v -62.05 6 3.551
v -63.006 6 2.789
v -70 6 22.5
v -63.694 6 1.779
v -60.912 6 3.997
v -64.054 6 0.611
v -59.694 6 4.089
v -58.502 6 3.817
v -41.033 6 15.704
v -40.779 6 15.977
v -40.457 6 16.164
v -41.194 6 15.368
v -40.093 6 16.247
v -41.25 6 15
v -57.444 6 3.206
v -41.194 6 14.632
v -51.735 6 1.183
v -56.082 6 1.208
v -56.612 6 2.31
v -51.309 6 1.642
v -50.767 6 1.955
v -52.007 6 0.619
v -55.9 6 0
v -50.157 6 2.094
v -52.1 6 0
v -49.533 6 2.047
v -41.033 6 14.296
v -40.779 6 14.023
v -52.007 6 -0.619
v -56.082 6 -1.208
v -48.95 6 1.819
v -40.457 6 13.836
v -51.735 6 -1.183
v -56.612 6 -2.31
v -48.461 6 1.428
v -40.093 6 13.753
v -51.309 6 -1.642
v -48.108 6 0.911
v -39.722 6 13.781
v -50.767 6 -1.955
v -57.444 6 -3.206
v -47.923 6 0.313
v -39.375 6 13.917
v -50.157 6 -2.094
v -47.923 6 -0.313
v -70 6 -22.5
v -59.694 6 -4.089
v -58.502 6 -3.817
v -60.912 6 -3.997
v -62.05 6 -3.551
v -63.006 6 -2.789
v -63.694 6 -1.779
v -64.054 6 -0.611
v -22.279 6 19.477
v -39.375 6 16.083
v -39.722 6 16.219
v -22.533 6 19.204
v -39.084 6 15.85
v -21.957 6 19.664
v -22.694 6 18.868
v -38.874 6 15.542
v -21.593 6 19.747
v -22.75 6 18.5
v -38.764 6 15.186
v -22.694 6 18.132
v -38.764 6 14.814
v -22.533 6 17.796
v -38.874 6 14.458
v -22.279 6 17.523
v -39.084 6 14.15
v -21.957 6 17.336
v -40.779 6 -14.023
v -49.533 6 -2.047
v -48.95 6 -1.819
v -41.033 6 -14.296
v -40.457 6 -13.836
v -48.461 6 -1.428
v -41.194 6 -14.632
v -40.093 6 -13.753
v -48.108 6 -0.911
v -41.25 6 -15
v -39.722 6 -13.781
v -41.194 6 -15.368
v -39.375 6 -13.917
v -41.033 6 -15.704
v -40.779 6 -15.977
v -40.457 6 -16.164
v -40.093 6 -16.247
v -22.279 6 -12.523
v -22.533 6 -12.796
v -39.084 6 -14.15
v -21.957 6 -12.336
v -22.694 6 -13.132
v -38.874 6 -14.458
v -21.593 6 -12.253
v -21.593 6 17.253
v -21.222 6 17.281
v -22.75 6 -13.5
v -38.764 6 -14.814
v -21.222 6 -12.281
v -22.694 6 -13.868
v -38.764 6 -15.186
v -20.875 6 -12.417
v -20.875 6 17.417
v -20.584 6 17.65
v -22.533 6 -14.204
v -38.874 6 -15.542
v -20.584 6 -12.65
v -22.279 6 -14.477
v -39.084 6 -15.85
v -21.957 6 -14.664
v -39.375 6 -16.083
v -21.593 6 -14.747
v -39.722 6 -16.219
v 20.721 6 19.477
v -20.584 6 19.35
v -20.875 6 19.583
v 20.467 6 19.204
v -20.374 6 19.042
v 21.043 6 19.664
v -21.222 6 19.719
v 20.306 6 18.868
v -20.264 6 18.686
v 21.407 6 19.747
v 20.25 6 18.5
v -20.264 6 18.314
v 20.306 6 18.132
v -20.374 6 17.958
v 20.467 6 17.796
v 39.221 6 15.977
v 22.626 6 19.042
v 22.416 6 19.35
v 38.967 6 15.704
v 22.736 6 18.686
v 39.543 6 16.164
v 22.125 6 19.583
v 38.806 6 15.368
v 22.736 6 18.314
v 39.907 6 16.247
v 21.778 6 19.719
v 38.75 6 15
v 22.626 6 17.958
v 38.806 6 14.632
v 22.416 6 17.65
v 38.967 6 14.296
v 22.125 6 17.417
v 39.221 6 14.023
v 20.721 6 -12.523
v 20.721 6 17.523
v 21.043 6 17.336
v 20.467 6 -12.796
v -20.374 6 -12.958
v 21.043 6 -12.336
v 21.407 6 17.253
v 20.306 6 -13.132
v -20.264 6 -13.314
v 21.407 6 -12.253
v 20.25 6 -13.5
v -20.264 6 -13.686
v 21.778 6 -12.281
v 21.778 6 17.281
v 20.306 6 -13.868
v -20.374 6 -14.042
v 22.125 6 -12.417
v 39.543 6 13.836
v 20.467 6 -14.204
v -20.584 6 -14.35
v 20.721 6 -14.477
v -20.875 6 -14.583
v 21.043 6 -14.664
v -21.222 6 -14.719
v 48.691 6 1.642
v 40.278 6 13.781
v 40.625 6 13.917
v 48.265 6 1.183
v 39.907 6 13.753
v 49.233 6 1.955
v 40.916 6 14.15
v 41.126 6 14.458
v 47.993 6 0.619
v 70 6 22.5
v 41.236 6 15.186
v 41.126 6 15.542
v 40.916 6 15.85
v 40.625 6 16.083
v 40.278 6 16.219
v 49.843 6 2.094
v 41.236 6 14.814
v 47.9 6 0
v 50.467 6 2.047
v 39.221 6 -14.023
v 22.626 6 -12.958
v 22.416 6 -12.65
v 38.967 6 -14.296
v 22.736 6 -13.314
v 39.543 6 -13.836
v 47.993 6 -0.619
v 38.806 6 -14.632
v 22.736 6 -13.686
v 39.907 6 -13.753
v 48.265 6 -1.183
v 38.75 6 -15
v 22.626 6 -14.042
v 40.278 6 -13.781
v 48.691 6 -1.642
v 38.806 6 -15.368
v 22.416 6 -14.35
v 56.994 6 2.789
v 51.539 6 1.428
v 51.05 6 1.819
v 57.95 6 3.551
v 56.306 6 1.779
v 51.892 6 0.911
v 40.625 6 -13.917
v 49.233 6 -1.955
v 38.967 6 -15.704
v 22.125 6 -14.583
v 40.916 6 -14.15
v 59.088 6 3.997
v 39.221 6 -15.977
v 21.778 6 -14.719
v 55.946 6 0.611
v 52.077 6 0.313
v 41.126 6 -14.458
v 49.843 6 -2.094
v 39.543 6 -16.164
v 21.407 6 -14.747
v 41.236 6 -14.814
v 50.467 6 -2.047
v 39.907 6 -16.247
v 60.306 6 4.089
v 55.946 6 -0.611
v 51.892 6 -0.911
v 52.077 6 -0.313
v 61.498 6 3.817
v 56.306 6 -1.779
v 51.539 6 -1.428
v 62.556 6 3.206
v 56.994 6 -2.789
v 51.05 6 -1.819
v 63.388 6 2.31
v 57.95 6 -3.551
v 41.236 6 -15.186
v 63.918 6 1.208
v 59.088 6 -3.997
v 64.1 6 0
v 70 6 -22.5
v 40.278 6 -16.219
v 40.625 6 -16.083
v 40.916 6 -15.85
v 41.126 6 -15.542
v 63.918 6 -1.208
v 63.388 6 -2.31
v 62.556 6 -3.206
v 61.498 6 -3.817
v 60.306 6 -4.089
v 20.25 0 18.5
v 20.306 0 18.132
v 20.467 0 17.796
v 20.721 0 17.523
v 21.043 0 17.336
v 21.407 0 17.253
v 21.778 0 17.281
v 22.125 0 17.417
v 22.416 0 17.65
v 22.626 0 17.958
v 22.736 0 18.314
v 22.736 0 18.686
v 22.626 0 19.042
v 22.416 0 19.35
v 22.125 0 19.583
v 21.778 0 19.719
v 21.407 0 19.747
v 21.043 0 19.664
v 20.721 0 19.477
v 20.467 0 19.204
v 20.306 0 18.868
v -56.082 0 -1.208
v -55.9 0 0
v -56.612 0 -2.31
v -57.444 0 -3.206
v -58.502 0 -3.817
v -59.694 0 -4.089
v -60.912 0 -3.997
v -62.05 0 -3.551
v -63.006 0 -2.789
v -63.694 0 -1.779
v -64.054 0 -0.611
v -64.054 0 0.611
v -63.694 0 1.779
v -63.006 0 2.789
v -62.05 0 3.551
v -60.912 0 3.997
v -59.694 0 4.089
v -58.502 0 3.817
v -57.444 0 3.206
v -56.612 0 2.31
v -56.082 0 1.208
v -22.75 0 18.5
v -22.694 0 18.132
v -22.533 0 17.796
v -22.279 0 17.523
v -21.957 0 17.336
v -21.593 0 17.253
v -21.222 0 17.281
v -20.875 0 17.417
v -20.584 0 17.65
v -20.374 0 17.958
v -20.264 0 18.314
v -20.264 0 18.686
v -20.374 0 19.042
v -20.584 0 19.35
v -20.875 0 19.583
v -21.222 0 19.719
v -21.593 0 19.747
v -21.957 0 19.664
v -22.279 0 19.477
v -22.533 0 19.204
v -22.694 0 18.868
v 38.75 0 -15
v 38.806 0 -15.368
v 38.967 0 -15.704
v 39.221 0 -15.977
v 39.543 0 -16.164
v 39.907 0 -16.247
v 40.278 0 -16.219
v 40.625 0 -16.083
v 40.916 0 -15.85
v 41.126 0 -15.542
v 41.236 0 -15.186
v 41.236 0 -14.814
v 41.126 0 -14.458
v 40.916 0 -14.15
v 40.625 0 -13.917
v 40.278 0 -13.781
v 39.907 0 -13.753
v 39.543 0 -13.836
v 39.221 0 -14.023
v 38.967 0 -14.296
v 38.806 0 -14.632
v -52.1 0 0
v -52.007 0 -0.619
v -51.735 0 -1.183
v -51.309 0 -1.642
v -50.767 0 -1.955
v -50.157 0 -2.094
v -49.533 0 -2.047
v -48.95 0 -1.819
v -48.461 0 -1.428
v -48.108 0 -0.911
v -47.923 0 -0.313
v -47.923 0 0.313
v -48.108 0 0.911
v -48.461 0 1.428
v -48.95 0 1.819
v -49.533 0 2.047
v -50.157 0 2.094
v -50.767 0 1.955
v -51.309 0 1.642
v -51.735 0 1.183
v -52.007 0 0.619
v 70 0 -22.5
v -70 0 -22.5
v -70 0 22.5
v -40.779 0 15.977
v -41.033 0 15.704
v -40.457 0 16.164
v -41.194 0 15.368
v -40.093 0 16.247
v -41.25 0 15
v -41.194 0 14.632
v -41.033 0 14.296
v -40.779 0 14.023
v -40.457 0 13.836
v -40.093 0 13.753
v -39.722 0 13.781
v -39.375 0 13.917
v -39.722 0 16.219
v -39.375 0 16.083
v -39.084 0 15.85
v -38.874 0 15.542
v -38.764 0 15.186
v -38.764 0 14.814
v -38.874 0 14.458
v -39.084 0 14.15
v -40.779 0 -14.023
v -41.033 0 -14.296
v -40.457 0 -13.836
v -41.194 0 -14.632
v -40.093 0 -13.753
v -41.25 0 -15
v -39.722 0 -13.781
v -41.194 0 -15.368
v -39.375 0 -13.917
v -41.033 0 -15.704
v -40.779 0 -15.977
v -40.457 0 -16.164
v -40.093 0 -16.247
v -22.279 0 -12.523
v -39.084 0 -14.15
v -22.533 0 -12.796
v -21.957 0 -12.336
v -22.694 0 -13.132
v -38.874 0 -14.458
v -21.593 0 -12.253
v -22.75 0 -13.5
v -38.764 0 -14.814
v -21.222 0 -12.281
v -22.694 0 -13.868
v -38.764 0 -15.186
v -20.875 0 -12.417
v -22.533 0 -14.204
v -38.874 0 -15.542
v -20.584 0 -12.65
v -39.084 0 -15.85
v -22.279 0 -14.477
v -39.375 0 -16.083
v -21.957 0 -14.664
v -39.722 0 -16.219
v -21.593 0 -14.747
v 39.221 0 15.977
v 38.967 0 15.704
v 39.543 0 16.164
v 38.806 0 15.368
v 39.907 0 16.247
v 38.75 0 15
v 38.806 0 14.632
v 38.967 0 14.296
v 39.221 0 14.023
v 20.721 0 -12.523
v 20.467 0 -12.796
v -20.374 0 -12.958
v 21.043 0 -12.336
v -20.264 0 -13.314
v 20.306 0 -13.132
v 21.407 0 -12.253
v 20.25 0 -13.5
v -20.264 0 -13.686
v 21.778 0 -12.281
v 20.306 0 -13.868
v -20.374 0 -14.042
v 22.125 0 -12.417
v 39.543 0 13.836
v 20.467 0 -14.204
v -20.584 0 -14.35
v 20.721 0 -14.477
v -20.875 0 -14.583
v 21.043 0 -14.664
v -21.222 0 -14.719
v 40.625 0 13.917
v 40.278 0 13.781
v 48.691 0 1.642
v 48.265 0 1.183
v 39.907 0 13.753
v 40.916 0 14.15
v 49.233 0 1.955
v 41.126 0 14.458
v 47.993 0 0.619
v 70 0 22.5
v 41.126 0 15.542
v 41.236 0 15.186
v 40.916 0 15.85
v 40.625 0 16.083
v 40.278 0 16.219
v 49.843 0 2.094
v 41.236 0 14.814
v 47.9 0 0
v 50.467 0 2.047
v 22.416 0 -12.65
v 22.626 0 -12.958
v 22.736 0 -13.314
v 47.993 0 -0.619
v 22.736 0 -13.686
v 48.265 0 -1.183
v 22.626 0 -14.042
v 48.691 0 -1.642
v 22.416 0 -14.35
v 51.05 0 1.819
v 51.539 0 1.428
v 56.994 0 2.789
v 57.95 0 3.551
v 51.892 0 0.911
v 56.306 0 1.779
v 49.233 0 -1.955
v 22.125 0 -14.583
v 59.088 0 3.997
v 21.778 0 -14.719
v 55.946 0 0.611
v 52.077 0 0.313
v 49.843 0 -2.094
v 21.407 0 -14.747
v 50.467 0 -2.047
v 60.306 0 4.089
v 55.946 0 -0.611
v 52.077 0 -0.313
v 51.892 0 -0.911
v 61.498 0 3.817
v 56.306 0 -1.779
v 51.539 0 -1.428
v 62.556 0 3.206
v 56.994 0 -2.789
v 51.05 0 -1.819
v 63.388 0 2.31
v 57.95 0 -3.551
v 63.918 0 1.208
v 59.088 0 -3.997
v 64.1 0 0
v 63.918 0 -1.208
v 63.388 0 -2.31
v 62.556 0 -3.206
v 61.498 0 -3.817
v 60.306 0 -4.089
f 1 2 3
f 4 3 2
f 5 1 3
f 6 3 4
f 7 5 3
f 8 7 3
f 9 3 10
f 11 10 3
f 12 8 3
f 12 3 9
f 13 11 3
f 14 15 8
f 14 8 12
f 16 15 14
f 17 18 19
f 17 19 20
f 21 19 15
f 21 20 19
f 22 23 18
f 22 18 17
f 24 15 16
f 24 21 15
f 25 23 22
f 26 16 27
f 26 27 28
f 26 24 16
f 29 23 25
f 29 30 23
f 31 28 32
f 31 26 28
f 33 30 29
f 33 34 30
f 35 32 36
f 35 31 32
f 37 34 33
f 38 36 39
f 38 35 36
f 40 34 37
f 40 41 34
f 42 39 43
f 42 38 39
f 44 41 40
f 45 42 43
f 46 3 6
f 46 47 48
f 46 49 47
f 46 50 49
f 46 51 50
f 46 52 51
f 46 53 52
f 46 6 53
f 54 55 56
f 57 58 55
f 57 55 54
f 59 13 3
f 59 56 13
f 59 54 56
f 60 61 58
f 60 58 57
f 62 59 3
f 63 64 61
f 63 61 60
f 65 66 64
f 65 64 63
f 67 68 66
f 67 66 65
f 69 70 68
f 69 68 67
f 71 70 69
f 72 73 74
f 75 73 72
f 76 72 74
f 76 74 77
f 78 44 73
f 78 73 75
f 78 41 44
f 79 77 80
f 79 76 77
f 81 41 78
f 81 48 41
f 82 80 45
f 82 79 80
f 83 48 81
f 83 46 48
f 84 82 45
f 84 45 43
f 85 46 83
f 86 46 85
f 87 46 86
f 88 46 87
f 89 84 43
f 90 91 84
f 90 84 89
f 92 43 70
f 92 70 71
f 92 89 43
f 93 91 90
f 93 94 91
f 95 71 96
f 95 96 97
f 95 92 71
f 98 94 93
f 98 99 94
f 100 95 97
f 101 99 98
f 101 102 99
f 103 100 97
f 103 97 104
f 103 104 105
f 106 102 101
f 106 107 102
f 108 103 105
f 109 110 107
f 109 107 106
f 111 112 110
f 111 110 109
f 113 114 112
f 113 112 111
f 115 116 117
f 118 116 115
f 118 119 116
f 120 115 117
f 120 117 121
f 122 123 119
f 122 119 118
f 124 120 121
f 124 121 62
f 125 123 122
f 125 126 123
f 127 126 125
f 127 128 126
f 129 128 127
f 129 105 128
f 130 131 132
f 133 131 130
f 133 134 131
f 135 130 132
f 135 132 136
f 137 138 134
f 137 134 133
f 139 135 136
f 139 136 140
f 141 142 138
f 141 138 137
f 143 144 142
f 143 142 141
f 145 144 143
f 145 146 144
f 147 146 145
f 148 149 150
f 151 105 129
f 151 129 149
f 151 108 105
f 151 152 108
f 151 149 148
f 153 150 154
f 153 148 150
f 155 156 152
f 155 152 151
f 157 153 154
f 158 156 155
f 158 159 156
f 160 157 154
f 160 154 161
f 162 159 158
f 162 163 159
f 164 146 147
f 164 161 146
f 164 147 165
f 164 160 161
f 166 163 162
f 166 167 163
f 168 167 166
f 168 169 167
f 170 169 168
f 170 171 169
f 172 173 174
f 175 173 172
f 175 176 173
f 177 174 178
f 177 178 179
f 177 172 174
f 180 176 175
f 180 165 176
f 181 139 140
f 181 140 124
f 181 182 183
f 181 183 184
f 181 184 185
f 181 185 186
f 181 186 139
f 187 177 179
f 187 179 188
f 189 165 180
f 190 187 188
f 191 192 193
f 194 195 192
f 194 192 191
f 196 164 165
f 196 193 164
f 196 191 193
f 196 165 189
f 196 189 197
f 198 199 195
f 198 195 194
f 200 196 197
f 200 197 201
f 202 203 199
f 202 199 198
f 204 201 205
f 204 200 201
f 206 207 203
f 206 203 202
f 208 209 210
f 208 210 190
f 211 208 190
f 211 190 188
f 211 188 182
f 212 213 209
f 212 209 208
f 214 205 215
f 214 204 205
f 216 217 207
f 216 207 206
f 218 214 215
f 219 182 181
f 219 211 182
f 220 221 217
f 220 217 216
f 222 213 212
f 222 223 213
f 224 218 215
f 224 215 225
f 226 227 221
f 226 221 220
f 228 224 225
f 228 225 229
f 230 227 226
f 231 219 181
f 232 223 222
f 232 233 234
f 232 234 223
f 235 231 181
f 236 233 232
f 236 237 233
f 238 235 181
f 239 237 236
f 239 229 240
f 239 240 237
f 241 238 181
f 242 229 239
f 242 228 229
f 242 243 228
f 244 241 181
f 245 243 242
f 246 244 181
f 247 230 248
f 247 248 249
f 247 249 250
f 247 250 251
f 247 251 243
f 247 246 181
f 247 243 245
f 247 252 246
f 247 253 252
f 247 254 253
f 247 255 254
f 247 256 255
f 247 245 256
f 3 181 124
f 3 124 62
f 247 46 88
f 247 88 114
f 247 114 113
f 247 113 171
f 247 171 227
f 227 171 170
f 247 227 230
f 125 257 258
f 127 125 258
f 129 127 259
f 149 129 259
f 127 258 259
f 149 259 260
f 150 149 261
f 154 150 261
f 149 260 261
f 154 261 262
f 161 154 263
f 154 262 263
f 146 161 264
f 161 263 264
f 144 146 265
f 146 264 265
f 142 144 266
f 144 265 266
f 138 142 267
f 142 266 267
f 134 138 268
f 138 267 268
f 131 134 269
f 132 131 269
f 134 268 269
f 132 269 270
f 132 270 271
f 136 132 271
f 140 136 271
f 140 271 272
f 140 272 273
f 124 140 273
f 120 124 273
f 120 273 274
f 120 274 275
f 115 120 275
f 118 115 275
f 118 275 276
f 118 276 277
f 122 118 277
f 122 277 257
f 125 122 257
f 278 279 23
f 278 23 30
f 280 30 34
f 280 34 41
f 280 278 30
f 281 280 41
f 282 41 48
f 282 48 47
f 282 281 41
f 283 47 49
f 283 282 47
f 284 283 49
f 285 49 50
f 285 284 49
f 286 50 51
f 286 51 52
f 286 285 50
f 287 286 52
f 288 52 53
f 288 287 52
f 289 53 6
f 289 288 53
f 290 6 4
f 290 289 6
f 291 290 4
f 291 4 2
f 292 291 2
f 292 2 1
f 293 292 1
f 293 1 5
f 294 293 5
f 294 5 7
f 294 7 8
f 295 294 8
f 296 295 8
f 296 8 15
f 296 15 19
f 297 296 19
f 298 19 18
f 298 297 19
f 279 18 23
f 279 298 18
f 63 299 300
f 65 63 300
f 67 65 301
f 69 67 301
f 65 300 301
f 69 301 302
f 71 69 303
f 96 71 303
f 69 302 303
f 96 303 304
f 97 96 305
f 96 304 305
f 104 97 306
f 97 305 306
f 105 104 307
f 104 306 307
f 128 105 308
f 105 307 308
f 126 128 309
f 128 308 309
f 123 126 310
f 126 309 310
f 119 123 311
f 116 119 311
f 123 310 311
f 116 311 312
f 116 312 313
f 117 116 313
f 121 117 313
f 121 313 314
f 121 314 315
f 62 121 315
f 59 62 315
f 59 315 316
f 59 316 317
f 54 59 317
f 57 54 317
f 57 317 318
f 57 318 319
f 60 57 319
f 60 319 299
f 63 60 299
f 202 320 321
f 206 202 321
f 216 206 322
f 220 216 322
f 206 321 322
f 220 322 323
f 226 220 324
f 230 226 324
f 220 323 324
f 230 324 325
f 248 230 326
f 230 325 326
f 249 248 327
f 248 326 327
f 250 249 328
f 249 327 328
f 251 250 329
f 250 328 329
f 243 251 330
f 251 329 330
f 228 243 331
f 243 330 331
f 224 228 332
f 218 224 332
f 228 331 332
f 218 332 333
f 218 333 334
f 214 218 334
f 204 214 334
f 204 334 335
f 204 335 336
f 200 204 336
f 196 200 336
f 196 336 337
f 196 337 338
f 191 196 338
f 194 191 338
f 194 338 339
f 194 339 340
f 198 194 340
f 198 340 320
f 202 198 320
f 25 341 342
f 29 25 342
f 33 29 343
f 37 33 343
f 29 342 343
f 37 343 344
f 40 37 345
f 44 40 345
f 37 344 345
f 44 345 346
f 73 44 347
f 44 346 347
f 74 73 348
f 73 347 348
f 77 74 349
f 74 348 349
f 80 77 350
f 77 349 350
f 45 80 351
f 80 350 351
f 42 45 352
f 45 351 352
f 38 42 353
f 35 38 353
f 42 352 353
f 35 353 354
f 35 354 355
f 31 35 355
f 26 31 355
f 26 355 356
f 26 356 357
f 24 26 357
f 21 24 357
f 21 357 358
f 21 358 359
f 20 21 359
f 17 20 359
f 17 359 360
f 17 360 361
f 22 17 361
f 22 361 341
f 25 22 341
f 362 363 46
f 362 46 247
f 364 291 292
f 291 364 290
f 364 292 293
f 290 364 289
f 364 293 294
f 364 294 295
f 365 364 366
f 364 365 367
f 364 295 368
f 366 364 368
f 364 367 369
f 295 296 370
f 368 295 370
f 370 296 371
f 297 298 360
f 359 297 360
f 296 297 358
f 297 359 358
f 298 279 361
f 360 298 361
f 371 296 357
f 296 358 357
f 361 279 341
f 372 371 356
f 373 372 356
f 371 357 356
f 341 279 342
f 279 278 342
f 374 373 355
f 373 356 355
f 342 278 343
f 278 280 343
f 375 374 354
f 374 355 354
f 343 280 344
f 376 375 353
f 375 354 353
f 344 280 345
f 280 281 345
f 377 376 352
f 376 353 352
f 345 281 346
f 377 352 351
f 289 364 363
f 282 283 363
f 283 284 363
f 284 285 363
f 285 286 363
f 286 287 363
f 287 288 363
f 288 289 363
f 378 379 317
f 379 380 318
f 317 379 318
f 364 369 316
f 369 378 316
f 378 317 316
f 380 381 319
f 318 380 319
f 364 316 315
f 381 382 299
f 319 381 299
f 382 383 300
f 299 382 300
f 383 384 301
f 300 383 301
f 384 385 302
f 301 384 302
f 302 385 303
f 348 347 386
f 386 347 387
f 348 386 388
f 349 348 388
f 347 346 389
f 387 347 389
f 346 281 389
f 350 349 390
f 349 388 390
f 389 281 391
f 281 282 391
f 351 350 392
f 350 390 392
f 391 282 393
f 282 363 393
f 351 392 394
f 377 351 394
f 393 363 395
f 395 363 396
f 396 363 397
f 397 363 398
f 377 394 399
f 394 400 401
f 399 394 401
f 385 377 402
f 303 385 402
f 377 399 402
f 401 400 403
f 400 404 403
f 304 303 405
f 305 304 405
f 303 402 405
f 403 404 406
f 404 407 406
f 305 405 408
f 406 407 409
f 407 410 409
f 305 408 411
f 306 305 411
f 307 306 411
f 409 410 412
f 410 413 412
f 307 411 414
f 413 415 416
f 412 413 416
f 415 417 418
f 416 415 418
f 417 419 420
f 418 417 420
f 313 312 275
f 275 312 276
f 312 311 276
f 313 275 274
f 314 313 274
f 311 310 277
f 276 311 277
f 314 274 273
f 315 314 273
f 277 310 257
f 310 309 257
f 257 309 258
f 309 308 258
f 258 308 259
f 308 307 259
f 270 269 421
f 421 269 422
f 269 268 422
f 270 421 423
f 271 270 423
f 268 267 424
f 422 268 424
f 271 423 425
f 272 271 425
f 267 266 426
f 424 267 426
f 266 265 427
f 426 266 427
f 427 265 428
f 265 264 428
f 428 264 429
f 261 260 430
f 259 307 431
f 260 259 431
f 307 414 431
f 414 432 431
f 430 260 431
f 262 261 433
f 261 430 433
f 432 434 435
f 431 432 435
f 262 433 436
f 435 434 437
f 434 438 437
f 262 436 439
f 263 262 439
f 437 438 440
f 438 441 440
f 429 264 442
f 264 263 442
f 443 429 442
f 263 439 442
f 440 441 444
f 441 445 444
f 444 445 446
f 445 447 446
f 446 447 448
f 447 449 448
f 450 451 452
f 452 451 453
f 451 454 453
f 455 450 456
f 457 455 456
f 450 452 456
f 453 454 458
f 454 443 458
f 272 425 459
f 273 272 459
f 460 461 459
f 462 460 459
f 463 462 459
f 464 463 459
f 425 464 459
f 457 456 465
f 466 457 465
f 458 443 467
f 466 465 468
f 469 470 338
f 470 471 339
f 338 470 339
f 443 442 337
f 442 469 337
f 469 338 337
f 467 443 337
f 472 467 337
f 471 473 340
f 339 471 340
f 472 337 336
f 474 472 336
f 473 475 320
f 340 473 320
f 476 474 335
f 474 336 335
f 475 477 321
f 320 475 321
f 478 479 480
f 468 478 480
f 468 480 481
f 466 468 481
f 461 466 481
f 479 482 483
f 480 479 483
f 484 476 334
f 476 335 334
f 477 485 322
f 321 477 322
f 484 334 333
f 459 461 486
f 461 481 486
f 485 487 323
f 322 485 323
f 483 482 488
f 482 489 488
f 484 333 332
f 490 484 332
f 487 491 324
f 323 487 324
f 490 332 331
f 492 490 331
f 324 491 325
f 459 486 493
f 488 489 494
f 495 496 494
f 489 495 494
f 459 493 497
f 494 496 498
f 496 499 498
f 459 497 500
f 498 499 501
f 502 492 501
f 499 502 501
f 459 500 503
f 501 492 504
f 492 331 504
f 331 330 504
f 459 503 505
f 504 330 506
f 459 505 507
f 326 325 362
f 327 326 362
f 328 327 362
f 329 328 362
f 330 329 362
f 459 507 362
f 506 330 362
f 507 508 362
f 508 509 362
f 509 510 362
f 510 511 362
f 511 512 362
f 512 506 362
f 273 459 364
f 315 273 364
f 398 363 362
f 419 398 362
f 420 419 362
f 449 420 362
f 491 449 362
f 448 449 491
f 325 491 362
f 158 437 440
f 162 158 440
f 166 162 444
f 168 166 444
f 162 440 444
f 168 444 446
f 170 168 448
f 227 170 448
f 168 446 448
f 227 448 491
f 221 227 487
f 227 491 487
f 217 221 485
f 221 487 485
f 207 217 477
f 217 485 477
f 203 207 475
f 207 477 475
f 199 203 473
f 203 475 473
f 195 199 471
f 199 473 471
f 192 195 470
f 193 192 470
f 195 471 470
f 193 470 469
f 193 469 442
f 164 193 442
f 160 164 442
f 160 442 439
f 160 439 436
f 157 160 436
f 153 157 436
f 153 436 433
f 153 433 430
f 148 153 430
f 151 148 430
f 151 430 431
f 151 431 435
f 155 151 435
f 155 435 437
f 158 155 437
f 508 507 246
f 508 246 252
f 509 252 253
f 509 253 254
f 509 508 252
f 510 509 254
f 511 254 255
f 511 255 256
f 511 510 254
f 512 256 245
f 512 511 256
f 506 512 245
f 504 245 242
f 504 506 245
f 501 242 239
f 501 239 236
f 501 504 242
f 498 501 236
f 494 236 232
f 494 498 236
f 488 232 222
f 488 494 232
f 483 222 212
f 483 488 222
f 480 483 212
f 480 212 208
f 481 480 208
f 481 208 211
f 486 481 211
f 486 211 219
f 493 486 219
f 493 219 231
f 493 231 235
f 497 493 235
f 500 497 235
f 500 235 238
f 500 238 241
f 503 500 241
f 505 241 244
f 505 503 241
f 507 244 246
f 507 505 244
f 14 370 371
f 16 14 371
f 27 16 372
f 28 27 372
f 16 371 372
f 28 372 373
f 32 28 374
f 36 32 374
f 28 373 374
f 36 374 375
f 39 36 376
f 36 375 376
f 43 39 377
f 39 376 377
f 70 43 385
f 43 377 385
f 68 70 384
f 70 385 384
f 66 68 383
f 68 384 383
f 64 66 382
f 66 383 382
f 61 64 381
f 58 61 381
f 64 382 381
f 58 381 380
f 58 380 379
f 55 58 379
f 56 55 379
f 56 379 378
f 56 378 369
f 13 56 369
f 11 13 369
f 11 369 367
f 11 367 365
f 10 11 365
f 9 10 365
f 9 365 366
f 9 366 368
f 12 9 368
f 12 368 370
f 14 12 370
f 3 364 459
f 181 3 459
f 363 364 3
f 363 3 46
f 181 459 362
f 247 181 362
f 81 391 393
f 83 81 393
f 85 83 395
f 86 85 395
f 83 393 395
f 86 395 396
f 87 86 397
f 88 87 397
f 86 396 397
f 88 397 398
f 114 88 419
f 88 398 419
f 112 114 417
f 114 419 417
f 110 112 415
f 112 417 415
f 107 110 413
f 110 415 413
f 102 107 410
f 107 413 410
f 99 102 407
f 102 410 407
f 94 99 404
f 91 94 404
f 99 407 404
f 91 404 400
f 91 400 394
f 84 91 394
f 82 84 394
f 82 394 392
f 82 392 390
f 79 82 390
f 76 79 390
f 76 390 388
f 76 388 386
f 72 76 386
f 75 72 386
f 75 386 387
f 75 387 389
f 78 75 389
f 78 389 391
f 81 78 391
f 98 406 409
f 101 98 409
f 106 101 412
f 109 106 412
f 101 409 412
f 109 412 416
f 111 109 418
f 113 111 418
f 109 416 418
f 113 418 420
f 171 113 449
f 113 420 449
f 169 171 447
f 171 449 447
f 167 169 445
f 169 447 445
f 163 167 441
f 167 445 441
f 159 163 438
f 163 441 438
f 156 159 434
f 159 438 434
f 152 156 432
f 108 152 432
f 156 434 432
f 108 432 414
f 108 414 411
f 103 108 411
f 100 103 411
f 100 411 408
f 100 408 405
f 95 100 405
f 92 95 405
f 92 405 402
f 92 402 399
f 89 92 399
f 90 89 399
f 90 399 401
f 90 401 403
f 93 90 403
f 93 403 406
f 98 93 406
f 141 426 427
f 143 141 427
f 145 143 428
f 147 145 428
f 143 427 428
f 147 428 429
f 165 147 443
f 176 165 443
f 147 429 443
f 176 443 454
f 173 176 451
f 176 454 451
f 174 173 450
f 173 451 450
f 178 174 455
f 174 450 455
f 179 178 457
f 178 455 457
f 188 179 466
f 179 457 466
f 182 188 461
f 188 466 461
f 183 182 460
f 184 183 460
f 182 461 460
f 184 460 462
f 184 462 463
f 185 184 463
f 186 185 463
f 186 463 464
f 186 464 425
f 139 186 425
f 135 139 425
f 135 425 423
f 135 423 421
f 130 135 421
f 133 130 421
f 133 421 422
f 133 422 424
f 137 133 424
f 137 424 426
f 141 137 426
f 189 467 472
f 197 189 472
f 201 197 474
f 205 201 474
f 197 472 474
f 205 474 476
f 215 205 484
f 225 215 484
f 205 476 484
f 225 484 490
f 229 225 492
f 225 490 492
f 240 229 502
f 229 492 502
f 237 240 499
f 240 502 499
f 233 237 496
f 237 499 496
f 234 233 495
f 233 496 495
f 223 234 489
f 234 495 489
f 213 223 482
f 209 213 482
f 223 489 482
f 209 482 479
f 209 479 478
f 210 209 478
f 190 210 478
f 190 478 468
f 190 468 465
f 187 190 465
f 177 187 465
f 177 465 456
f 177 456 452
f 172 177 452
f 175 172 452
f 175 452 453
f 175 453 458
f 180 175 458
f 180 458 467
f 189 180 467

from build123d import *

# Parameters (mm, degrees)
SKETCH_1_W              = 140
SKETCH_1_H              = 45
SKETCH_1_R              = 4.1
SKETCH_1_R_2            = 0.5
EXTRUDE_1_DEPTH         = 6
M3_TAPPED_HOLE5_D       = 2.5
M3_TAPPED_HOLE2_D       = 2.5
HOLE_WIZARD_4_2_4_2_1_D = 4.2


with BuildPart() as part:
    # 草图1 → 凸台-拉伸1 (new body)
    with BuildSketch(Plane(origin=(0, 0, 0), x_dir=(1, 0, 0), z_dir=(0, 1, 0))):
        Rectangle(SKETCH_1_W, SKETCH_1_H)
        with Locations((60, 0)):
            Circle(SKETCH_1_R, mode=Mode.SUBTRACT)
        with Locations((-60, 0)):
            Circle(SKETCH_1_R, mode=Mode.SUBTRACT)
        with Locations((-40, 15)):
            Circle(SKETCH_1_R_2, mode=Mode.SUBTRACT)
        with Locations((40, 15)):
            Circle(SKETCH_1_R_2, mode=Mode.SUBTRACT)
        with Locations((40, -15)):
            Circle(SKETCH_1_R_2, mode=Mode.SUBTRACT)
        with Locations((-40, -15)):
            Circle(SKETCH_1_R_2, mode=Mode.SUBTRACT)
    extrude(amount=EXTRUDE_1_DEPTH)

    # M3 Tapped Hole5 (through all)
    with Locations(Plane(origin=(0, 6, 0), x_dir=(1, 0, 0), z_dir=(0, 1, 0))):
        with Locations((-40, 15), (-40, -15), (40, -15), (40, 15)):
            Hole(M3_TAPPED_HOLE5_D / 2)

    # M3 Tapped Hole2 (through all)
    with Locations(Plane(origin=(0, 6, 0), x_dir=(1, 0, 0), z_dir=(0, 1, 0))):
        with Locations((-21.5, 13.5), (21.5, 13.5), (21.5, -18.5), (-21.5, -18.5)):
            Hole(M3_TAPPED_HOLE2_D / 2)

    # Ø4.2 (4.2) 直径孔1 (through all)
    with Locations(Plane(origin=(0, 6, 0), x_dir=(1, 0, 0), z_dir=(0, 1, 0))):
        with Locations((50, 0), (-50, 0)):
            Hole(HOLE_WIZARD_4_2_4_2_1_D / 2)


solid = part.part
